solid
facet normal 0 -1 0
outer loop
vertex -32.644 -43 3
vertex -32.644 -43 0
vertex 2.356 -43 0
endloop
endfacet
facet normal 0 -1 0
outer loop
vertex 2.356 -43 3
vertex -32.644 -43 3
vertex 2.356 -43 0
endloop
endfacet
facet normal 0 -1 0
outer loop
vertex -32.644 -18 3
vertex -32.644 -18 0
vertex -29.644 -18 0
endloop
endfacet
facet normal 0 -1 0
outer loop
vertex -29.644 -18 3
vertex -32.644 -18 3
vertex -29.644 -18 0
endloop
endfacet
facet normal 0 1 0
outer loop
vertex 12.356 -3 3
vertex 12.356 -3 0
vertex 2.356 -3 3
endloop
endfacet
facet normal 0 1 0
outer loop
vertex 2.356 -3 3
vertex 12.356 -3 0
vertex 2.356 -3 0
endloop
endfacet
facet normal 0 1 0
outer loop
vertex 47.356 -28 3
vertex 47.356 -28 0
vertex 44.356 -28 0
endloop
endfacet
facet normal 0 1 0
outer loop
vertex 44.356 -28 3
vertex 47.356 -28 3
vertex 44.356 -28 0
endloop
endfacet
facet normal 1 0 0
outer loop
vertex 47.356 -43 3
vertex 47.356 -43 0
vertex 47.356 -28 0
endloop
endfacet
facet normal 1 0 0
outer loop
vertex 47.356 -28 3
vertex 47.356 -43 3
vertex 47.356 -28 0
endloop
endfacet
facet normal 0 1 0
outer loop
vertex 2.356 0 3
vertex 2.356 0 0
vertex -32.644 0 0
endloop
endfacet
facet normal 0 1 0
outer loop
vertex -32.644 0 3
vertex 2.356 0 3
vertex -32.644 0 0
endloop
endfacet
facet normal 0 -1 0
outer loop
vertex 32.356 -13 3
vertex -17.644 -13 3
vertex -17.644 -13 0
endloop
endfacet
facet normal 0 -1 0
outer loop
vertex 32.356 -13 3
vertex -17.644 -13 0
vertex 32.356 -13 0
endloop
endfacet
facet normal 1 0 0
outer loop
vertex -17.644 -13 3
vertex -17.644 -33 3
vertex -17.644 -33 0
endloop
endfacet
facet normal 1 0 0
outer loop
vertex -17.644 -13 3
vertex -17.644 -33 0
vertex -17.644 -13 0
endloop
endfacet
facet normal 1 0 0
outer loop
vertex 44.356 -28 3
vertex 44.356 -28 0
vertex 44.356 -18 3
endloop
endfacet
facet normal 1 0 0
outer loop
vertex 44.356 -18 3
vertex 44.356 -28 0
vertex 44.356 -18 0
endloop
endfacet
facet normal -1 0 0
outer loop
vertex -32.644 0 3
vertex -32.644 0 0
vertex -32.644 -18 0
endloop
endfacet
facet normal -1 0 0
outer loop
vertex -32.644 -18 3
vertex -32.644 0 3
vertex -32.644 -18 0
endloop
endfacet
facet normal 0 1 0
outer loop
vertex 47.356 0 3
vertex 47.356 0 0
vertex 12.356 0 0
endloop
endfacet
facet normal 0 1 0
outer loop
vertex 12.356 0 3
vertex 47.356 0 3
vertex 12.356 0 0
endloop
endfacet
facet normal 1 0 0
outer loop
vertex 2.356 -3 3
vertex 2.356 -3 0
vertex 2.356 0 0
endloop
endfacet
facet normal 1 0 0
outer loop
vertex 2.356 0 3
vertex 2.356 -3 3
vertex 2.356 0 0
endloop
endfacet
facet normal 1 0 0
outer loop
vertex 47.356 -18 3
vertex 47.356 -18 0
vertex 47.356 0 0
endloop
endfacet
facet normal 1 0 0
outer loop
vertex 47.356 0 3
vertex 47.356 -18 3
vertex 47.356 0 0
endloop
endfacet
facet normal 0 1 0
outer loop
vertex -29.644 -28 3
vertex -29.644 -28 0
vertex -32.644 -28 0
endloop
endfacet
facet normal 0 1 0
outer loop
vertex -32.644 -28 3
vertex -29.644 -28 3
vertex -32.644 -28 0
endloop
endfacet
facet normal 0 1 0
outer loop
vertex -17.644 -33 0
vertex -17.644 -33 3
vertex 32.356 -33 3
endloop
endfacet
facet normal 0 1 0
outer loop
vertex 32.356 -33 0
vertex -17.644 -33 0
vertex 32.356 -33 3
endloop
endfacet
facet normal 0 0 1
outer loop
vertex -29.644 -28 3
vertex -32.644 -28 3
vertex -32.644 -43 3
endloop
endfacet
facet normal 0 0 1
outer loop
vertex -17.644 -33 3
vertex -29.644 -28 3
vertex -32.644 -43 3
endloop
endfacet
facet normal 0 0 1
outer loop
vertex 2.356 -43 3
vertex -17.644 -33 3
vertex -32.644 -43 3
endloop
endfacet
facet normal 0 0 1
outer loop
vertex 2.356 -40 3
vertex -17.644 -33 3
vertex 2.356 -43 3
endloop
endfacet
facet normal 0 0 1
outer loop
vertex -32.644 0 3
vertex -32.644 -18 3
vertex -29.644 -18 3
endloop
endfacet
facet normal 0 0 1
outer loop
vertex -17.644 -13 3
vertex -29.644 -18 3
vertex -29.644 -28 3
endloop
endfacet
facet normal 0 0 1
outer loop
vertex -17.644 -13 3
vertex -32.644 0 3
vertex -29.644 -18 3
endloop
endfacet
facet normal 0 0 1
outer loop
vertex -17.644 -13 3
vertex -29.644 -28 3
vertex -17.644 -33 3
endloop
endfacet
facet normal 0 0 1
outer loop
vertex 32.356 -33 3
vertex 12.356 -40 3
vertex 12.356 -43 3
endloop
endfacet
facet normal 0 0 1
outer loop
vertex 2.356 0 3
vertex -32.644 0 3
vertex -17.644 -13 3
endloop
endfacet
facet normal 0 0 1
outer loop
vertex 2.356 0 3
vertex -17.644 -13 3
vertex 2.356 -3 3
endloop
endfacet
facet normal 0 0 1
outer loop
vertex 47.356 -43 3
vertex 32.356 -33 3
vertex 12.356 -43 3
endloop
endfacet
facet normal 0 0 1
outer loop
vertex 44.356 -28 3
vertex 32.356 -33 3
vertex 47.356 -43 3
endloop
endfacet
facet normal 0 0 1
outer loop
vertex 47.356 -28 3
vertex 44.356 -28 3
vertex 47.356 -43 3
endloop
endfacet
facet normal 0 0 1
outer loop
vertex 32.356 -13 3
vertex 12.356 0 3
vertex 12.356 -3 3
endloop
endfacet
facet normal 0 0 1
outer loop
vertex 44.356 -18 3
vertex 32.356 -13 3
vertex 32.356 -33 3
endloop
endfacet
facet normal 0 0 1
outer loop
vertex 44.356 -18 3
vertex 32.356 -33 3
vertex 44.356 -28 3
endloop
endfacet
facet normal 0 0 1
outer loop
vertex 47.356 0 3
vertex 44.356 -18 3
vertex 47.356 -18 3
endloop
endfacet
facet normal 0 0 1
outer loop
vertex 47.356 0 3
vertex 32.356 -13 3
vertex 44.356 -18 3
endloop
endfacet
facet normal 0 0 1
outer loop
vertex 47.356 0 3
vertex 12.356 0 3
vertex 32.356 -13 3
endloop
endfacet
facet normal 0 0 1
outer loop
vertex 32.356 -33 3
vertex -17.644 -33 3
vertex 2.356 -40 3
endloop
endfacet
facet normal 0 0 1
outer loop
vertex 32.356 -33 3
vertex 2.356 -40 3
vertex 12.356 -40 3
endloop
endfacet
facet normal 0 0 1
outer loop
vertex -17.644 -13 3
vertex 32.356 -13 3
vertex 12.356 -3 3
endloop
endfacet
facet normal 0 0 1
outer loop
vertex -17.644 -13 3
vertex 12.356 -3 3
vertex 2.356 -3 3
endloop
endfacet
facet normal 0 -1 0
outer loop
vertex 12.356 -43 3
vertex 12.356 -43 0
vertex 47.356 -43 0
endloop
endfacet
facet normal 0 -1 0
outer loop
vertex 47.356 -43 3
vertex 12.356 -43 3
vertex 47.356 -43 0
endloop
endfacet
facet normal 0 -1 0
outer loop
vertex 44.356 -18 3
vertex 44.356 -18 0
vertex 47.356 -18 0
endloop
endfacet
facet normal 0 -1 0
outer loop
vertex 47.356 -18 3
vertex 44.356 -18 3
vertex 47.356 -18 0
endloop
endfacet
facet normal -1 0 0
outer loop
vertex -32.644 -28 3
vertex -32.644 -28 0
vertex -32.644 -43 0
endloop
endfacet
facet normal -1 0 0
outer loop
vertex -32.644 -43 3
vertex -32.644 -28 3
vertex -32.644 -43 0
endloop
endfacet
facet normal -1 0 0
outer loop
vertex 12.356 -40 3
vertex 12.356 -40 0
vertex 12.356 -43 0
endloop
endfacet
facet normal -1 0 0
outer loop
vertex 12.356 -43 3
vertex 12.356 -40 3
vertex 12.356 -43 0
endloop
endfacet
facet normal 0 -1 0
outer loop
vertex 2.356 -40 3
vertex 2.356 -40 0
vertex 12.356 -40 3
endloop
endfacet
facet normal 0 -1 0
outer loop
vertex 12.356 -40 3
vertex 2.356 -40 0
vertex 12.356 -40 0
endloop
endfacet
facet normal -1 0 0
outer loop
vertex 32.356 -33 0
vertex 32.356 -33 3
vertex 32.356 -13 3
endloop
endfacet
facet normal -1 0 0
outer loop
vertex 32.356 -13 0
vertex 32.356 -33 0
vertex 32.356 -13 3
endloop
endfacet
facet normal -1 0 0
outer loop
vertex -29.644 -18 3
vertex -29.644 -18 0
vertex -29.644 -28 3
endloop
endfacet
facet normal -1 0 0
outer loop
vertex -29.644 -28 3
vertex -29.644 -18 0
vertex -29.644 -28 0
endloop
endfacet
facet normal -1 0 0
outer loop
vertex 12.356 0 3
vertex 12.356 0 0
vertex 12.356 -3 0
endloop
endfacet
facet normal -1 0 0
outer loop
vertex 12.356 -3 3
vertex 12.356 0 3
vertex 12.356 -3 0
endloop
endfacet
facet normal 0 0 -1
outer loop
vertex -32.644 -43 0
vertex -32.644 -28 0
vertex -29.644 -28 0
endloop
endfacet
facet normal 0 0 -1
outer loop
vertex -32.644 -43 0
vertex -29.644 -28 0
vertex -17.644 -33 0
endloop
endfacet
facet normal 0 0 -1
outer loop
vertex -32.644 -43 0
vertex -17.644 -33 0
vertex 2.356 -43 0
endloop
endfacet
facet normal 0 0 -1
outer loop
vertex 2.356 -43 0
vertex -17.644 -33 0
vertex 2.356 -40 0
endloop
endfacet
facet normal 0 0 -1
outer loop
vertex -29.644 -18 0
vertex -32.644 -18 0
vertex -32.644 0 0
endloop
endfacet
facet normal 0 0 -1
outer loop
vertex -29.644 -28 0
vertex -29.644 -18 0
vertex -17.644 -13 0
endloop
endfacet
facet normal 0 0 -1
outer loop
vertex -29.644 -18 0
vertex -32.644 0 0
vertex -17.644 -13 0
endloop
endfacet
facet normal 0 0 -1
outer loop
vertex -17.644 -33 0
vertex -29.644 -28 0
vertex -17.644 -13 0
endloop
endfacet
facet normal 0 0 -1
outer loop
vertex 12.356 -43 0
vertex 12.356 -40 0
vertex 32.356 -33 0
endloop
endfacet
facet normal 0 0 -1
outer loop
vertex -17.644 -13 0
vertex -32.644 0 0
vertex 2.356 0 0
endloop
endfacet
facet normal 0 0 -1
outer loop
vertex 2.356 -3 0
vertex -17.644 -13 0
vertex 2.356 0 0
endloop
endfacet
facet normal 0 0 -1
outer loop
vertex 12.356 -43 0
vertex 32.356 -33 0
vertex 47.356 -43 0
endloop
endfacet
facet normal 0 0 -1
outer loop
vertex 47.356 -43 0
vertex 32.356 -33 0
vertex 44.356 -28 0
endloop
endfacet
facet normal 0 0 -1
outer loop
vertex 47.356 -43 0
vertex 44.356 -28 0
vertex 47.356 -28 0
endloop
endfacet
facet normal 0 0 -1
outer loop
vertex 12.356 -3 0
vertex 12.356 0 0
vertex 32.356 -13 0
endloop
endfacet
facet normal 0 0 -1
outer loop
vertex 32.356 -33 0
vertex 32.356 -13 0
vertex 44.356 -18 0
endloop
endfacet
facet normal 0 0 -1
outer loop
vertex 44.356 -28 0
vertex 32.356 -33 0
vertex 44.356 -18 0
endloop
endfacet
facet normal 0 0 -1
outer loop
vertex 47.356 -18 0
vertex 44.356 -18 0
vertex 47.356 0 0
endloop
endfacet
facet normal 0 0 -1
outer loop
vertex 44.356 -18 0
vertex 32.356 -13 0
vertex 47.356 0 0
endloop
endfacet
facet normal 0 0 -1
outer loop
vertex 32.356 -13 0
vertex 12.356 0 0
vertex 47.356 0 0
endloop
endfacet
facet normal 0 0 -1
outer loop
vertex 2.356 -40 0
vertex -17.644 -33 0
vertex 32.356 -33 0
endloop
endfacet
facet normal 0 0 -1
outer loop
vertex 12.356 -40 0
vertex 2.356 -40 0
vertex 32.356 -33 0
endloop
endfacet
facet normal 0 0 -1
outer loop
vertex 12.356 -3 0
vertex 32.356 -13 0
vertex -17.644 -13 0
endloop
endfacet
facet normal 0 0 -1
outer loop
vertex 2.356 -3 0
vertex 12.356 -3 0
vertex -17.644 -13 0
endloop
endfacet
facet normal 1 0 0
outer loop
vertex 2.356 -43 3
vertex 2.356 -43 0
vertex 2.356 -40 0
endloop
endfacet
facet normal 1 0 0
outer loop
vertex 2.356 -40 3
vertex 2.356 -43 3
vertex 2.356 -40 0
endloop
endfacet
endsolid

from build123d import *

# Parameters (mm, degrees)
BOSS_EXTRUDE1_DEPTH = 3
SKETCH2_W           = 50
SKETCH2_H           = 20
CUT_EXTRUDE1_DEPTH  = 10


with BuildPart() as part:
    # Sketch1 → Boss-Extrude1 (new body)
    with BuildSketch(Plane.XY):
        Polygon((-32.643571906, 0), (-32.643571906, -18), (-29.643571906, -18), (-29.643571906, -28), (-32.643571906, -28), (-32.643571906, -43), (2.356428094, -43), (2.356428094, -40), (12.356428094, -40), (12.356428094, -43), (47.356428094, -43), (47.356428094, -28), (44.356428094, -28), (44.356428094, -18), (47.356428094, -18), (47.356428094, -3), (47.356428094, 0), (12.356428094, 0), (12.356428094, -3), (2.356428094, -3), (2.356428094, 0), align=None)
    extrude(amount=BOSS_EXTRUDE1_DEPTH)

    # Sketch2 → Cut-Extrude1 (cut)
    with BuildSketch(Plane.XY.offset(3)):
        with Locations((7.356428094, -23)):
            Rectangle(SKETCH2_W, SKETCH2_H)
    extrude(amount=-CUT_EXTRUDE1_DEPTH, mode=Mode.SUBTRACT)


solid = part.part
